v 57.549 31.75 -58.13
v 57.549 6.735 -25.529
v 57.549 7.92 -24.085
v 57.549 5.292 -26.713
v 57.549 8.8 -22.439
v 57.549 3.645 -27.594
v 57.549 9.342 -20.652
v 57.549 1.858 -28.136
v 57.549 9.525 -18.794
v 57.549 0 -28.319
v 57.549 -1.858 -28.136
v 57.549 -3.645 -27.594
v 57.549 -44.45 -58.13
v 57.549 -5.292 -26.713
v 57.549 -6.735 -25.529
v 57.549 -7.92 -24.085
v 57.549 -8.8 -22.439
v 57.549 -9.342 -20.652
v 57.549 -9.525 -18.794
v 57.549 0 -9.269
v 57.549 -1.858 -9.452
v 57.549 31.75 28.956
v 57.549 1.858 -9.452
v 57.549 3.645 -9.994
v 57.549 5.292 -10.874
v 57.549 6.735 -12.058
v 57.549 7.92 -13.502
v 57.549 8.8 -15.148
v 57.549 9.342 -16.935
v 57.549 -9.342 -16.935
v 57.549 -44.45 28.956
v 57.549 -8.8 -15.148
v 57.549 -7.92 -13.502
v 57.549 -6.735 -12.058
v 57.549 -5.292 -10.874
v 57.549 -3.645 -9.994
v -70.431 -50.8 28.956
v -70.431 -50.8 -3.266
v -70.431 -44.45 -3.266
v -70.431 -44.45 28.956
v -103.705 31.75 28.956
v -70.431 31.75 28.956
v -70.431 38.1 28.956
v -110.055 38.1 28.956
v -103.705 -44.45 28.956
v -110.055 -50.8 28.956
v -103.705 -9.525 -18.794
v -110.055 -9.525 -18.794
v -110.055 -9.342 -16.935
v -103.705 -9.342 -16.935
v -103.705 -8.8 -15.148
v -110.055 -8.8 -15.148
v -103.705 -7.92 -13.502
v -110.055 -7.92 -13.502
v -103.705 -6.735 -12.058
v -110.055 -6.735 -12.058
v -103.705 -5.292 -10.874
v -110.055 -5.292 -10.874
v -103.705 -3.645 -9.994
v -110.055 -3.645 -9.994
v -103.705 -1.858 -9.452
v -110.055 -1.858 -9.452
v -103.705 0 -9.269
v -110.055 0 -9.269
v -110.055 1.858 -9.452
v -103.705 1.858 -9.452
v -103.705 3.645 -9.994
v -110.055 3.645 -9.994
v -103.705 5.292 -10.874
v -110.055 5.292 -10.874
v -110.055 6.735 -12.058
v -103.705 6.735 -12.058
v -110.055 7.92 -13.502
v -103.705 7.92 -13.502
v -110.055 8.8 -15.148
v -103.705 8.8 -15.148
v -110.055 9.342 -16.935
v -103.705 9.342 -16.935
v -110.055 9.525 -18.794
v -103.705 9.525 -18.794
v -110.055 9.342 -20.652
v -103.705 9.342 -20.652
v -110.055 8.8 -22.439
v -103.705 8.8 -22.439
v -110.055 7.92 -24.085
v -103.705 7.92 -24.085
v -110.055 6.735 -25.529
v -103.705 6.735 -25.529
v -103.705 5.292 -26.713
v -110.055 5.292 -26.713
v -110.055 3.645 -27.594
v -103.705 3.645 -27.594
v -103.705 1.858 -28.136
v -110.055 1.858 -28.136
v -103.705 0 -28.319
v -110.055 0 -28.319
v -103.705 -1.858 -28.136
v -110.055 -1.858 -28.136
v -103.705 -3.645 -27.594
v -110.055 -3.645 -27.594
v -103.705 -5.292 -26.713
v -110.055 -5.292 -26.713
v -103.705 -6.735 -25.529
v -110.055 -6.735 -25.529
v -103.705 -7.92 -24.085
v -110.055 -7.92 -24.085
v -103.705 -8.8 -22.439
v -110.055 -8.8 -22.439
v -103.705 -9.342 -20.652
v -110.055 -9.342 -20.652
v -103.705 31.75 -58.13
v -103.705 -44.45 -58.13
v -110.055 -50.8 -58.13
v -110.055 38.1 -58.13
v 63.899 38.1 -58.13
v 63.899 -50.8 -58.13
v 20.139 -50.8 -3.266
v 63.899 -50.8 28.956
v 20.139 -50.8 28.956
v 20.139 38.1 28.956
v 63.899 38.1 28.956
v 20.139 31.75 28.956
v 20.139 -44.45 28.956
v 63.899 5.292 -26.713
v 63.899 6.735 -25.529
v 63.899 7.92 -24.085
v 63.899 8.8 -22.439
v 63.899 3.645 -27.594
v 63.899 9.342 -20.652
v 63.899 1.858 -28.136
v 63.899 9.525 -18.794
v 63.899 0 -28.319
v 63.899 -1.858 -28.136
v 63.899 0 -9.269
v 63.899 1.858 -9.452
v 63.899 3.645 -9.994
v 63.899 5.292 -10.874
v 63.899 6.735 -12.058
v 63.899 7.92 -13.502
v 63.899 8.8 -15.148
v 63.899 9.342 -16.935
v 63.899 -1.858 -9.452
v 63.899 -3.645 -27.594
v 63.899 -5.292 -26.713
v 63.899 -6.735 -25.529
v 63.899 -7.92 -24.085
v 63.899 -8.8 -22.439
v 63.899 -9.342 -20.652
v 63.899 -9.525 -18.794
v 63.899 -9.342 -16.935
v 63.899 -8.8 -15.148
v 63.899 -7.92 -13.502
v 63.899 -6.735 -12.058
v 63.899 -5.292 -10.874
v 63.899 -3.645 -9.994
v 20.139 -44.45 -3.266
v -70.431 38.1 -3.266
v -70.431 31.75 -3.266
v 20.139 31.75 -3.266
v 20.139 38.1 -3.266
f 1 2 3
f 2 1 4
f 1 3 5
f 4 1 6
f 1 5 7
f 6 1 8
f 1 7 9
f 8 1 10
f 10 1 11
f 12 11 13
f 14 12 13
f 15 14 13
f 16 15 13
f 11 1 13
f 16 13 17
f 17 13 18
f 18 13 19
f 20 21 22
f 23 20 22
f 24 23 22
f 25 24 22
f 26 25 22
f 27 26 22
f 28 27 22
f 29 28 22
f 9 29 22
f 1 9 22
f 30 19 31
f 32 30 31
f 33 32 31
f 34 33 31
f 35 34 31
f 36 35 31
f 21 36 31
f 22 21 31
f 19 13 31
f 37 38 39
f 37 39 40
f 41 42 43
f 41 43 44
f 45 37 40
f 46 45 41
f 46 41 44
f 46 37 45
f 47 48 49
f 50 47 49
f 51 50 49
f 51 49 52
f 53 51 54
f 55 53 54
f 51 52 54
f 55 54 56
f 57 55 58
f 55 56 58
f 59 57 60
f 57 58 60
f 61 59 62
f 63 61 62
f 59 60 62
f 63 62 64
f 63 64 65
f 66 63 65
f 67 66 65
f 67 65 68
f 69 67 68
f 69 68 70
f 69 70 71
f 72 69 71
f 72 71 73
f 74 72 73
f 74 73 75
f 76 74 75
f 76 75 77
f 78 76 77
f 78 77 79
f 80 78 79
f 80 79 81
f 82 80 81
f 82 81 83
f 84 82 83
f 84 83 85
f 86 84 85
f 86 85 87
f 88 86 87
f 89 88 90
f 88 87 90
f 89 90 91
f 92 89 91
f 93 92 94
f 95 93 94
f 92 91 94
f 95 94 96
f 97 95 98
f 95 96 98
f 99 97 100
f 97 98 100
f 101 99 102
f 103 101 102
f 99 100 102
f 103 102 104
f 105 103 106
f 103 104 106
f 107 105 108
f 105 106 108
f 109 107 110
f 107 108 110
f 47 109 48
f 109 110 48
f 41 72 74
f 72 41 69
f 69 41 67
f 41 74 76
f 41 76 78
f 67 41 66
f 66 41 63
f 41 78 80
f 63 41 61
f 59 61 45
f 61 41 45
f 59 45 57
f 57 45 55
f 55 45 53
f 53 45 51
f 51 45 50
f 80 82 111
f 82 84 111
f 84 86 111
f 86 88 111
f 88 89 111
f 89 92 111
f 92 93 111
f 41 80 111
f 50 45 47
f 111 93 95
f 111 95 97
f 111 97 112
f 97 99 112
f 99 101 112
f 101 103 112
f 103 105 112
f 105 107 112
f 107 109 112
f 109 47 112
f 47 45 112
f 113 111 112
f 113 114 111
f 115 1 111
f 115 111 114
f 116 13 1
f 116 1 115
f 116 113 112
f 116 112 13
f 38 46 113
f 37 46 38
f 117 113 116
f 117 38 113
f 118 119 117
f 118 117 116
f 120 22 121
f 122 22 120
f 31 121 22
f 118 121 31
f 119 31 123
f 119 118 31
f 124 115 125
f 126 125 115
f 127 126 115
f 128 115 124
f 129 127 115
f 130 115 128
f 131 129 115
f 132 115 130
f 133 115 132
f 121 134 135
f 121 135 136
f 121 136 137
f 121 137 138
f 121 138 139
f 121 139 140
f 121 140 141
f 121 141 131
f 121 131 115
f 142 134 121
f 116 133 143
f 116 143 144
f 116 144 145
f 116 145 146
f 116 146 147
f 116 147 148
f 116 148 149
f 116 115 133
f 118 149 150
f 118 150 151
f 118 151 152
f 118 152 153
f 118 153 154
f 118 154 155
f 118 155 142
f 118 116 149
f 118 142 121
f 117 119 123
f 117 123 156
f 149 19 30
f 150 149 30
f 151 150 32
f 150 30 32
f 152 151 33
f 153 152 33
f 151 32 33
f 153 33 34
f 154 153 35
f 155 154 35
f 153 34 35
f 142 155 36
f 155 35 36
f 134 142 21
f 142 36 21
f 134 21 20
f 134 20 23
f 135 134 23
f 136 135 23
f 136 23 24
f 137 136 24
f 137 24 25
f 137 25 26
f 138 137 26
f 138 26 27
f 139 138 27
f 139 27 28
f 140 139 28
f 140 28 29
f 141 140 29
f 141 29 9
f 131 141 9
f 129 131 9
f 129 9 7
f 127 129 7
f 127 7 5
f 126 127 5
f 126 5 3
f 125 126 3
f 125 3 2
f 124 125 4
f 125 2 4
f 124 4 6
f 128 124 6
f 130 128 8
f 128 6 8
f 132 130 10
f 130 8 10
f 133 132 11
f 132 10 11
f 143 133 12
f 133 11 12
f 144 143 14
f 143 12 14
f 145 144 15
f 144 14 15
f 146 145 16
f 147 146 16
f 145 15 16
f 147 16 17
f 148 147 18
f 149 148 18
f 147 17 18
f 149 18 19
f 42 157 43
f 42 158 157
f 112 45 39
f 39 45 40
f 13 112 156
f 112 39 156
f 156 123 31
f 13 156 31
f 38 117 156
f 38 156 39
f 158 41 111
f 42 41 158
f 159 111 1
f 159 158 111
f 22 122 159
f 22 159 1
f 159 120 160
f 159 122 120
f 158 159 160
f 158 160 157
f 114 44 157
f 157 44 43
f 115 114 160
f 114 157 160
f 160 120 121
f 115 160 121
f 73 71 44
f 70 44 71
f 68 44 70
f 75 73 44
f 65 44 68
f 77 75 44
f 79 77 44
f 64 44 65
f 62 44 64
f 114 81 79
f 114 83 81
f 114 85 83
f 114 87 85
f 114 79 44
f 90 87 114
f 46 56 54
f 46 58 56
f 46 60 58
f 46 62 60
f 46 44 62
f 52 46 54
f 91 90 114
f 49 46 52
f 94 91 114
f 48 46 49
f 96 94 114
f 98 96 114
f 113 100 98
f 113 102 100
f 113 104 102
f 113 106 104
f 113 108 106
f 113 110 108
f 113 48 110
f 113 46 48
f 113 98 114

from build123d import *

# Parameters (mm, degrees)
F1_DEPTH      = 50.8
F1_DEPTH_BACK = 38.1
F2_T          = -6.35
F4_D          = 19.05


with BuildPart() as f1:
    # F0 (on Front) → F1 (new body, two sides)
    with BuildSketch(Plane.XZ) as f1_sk:
        Polygon((-110.054575, 28.956002), (-110.054575, -58.129717), (63.899137, -58.129717), (63.899137, 28.956002), (20.138571, 28.956002), (20.138571, -3.265714), (-70.430569, -3.265714), (-70.430569, 28.956002), align=None)
    extrude(amount=F1_DEPTH)
    extrude(f1_sk.sketch, amount=-F1_DEPTH_BACK)

    # F2
    f2_openings = [f1.faces().sort_by_distance(p)[0] for p in [
        (-90.242572, -6.35, 28.956002),
        (-70.430569, -6.35, 12.845144),
        (20.138571, -6.35, 12.845144),
        (42.018854, -6.35, 28.956002),
        (-25.145999, -6.35, -3.265714),
        (-23.077719, -6.35, -58.129717),
    ]]
    offset(amount=F2_T, openings=f2_openings)

    # F4 (through all)
    with Locations(Plane.YZ.offset(63.899137)):
        with Locations((0, -18.793555)):
            Hole(F4_D / 2)


solid = f1.part
